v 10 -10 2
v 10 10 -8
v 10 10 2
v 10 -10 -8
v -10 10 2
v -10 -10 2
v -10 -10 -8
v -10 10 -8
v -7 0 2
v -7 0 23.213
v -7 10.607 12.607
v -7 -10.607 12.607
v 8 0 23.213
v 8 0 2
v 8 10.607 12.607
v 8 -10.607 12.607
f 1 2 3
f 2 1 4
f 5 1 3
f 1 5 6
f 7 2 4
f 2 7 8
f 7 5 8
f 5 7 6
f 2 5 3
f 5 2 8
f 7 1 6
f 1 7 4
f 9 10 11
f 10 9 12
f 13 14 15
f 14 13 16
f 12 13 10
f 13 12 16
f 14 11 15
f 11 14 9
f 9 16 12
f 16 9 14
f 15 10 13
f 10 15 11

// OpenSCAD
/* coincident tests */
translate([0,0,2]) {
    translate([0,0,-5]) {
        cube([20,20,10], center=true);
    }
    translate([-7,0,0]) {
        rotate([45,0,0]) {
            cube([15,15,15]);
        }
    }
}
